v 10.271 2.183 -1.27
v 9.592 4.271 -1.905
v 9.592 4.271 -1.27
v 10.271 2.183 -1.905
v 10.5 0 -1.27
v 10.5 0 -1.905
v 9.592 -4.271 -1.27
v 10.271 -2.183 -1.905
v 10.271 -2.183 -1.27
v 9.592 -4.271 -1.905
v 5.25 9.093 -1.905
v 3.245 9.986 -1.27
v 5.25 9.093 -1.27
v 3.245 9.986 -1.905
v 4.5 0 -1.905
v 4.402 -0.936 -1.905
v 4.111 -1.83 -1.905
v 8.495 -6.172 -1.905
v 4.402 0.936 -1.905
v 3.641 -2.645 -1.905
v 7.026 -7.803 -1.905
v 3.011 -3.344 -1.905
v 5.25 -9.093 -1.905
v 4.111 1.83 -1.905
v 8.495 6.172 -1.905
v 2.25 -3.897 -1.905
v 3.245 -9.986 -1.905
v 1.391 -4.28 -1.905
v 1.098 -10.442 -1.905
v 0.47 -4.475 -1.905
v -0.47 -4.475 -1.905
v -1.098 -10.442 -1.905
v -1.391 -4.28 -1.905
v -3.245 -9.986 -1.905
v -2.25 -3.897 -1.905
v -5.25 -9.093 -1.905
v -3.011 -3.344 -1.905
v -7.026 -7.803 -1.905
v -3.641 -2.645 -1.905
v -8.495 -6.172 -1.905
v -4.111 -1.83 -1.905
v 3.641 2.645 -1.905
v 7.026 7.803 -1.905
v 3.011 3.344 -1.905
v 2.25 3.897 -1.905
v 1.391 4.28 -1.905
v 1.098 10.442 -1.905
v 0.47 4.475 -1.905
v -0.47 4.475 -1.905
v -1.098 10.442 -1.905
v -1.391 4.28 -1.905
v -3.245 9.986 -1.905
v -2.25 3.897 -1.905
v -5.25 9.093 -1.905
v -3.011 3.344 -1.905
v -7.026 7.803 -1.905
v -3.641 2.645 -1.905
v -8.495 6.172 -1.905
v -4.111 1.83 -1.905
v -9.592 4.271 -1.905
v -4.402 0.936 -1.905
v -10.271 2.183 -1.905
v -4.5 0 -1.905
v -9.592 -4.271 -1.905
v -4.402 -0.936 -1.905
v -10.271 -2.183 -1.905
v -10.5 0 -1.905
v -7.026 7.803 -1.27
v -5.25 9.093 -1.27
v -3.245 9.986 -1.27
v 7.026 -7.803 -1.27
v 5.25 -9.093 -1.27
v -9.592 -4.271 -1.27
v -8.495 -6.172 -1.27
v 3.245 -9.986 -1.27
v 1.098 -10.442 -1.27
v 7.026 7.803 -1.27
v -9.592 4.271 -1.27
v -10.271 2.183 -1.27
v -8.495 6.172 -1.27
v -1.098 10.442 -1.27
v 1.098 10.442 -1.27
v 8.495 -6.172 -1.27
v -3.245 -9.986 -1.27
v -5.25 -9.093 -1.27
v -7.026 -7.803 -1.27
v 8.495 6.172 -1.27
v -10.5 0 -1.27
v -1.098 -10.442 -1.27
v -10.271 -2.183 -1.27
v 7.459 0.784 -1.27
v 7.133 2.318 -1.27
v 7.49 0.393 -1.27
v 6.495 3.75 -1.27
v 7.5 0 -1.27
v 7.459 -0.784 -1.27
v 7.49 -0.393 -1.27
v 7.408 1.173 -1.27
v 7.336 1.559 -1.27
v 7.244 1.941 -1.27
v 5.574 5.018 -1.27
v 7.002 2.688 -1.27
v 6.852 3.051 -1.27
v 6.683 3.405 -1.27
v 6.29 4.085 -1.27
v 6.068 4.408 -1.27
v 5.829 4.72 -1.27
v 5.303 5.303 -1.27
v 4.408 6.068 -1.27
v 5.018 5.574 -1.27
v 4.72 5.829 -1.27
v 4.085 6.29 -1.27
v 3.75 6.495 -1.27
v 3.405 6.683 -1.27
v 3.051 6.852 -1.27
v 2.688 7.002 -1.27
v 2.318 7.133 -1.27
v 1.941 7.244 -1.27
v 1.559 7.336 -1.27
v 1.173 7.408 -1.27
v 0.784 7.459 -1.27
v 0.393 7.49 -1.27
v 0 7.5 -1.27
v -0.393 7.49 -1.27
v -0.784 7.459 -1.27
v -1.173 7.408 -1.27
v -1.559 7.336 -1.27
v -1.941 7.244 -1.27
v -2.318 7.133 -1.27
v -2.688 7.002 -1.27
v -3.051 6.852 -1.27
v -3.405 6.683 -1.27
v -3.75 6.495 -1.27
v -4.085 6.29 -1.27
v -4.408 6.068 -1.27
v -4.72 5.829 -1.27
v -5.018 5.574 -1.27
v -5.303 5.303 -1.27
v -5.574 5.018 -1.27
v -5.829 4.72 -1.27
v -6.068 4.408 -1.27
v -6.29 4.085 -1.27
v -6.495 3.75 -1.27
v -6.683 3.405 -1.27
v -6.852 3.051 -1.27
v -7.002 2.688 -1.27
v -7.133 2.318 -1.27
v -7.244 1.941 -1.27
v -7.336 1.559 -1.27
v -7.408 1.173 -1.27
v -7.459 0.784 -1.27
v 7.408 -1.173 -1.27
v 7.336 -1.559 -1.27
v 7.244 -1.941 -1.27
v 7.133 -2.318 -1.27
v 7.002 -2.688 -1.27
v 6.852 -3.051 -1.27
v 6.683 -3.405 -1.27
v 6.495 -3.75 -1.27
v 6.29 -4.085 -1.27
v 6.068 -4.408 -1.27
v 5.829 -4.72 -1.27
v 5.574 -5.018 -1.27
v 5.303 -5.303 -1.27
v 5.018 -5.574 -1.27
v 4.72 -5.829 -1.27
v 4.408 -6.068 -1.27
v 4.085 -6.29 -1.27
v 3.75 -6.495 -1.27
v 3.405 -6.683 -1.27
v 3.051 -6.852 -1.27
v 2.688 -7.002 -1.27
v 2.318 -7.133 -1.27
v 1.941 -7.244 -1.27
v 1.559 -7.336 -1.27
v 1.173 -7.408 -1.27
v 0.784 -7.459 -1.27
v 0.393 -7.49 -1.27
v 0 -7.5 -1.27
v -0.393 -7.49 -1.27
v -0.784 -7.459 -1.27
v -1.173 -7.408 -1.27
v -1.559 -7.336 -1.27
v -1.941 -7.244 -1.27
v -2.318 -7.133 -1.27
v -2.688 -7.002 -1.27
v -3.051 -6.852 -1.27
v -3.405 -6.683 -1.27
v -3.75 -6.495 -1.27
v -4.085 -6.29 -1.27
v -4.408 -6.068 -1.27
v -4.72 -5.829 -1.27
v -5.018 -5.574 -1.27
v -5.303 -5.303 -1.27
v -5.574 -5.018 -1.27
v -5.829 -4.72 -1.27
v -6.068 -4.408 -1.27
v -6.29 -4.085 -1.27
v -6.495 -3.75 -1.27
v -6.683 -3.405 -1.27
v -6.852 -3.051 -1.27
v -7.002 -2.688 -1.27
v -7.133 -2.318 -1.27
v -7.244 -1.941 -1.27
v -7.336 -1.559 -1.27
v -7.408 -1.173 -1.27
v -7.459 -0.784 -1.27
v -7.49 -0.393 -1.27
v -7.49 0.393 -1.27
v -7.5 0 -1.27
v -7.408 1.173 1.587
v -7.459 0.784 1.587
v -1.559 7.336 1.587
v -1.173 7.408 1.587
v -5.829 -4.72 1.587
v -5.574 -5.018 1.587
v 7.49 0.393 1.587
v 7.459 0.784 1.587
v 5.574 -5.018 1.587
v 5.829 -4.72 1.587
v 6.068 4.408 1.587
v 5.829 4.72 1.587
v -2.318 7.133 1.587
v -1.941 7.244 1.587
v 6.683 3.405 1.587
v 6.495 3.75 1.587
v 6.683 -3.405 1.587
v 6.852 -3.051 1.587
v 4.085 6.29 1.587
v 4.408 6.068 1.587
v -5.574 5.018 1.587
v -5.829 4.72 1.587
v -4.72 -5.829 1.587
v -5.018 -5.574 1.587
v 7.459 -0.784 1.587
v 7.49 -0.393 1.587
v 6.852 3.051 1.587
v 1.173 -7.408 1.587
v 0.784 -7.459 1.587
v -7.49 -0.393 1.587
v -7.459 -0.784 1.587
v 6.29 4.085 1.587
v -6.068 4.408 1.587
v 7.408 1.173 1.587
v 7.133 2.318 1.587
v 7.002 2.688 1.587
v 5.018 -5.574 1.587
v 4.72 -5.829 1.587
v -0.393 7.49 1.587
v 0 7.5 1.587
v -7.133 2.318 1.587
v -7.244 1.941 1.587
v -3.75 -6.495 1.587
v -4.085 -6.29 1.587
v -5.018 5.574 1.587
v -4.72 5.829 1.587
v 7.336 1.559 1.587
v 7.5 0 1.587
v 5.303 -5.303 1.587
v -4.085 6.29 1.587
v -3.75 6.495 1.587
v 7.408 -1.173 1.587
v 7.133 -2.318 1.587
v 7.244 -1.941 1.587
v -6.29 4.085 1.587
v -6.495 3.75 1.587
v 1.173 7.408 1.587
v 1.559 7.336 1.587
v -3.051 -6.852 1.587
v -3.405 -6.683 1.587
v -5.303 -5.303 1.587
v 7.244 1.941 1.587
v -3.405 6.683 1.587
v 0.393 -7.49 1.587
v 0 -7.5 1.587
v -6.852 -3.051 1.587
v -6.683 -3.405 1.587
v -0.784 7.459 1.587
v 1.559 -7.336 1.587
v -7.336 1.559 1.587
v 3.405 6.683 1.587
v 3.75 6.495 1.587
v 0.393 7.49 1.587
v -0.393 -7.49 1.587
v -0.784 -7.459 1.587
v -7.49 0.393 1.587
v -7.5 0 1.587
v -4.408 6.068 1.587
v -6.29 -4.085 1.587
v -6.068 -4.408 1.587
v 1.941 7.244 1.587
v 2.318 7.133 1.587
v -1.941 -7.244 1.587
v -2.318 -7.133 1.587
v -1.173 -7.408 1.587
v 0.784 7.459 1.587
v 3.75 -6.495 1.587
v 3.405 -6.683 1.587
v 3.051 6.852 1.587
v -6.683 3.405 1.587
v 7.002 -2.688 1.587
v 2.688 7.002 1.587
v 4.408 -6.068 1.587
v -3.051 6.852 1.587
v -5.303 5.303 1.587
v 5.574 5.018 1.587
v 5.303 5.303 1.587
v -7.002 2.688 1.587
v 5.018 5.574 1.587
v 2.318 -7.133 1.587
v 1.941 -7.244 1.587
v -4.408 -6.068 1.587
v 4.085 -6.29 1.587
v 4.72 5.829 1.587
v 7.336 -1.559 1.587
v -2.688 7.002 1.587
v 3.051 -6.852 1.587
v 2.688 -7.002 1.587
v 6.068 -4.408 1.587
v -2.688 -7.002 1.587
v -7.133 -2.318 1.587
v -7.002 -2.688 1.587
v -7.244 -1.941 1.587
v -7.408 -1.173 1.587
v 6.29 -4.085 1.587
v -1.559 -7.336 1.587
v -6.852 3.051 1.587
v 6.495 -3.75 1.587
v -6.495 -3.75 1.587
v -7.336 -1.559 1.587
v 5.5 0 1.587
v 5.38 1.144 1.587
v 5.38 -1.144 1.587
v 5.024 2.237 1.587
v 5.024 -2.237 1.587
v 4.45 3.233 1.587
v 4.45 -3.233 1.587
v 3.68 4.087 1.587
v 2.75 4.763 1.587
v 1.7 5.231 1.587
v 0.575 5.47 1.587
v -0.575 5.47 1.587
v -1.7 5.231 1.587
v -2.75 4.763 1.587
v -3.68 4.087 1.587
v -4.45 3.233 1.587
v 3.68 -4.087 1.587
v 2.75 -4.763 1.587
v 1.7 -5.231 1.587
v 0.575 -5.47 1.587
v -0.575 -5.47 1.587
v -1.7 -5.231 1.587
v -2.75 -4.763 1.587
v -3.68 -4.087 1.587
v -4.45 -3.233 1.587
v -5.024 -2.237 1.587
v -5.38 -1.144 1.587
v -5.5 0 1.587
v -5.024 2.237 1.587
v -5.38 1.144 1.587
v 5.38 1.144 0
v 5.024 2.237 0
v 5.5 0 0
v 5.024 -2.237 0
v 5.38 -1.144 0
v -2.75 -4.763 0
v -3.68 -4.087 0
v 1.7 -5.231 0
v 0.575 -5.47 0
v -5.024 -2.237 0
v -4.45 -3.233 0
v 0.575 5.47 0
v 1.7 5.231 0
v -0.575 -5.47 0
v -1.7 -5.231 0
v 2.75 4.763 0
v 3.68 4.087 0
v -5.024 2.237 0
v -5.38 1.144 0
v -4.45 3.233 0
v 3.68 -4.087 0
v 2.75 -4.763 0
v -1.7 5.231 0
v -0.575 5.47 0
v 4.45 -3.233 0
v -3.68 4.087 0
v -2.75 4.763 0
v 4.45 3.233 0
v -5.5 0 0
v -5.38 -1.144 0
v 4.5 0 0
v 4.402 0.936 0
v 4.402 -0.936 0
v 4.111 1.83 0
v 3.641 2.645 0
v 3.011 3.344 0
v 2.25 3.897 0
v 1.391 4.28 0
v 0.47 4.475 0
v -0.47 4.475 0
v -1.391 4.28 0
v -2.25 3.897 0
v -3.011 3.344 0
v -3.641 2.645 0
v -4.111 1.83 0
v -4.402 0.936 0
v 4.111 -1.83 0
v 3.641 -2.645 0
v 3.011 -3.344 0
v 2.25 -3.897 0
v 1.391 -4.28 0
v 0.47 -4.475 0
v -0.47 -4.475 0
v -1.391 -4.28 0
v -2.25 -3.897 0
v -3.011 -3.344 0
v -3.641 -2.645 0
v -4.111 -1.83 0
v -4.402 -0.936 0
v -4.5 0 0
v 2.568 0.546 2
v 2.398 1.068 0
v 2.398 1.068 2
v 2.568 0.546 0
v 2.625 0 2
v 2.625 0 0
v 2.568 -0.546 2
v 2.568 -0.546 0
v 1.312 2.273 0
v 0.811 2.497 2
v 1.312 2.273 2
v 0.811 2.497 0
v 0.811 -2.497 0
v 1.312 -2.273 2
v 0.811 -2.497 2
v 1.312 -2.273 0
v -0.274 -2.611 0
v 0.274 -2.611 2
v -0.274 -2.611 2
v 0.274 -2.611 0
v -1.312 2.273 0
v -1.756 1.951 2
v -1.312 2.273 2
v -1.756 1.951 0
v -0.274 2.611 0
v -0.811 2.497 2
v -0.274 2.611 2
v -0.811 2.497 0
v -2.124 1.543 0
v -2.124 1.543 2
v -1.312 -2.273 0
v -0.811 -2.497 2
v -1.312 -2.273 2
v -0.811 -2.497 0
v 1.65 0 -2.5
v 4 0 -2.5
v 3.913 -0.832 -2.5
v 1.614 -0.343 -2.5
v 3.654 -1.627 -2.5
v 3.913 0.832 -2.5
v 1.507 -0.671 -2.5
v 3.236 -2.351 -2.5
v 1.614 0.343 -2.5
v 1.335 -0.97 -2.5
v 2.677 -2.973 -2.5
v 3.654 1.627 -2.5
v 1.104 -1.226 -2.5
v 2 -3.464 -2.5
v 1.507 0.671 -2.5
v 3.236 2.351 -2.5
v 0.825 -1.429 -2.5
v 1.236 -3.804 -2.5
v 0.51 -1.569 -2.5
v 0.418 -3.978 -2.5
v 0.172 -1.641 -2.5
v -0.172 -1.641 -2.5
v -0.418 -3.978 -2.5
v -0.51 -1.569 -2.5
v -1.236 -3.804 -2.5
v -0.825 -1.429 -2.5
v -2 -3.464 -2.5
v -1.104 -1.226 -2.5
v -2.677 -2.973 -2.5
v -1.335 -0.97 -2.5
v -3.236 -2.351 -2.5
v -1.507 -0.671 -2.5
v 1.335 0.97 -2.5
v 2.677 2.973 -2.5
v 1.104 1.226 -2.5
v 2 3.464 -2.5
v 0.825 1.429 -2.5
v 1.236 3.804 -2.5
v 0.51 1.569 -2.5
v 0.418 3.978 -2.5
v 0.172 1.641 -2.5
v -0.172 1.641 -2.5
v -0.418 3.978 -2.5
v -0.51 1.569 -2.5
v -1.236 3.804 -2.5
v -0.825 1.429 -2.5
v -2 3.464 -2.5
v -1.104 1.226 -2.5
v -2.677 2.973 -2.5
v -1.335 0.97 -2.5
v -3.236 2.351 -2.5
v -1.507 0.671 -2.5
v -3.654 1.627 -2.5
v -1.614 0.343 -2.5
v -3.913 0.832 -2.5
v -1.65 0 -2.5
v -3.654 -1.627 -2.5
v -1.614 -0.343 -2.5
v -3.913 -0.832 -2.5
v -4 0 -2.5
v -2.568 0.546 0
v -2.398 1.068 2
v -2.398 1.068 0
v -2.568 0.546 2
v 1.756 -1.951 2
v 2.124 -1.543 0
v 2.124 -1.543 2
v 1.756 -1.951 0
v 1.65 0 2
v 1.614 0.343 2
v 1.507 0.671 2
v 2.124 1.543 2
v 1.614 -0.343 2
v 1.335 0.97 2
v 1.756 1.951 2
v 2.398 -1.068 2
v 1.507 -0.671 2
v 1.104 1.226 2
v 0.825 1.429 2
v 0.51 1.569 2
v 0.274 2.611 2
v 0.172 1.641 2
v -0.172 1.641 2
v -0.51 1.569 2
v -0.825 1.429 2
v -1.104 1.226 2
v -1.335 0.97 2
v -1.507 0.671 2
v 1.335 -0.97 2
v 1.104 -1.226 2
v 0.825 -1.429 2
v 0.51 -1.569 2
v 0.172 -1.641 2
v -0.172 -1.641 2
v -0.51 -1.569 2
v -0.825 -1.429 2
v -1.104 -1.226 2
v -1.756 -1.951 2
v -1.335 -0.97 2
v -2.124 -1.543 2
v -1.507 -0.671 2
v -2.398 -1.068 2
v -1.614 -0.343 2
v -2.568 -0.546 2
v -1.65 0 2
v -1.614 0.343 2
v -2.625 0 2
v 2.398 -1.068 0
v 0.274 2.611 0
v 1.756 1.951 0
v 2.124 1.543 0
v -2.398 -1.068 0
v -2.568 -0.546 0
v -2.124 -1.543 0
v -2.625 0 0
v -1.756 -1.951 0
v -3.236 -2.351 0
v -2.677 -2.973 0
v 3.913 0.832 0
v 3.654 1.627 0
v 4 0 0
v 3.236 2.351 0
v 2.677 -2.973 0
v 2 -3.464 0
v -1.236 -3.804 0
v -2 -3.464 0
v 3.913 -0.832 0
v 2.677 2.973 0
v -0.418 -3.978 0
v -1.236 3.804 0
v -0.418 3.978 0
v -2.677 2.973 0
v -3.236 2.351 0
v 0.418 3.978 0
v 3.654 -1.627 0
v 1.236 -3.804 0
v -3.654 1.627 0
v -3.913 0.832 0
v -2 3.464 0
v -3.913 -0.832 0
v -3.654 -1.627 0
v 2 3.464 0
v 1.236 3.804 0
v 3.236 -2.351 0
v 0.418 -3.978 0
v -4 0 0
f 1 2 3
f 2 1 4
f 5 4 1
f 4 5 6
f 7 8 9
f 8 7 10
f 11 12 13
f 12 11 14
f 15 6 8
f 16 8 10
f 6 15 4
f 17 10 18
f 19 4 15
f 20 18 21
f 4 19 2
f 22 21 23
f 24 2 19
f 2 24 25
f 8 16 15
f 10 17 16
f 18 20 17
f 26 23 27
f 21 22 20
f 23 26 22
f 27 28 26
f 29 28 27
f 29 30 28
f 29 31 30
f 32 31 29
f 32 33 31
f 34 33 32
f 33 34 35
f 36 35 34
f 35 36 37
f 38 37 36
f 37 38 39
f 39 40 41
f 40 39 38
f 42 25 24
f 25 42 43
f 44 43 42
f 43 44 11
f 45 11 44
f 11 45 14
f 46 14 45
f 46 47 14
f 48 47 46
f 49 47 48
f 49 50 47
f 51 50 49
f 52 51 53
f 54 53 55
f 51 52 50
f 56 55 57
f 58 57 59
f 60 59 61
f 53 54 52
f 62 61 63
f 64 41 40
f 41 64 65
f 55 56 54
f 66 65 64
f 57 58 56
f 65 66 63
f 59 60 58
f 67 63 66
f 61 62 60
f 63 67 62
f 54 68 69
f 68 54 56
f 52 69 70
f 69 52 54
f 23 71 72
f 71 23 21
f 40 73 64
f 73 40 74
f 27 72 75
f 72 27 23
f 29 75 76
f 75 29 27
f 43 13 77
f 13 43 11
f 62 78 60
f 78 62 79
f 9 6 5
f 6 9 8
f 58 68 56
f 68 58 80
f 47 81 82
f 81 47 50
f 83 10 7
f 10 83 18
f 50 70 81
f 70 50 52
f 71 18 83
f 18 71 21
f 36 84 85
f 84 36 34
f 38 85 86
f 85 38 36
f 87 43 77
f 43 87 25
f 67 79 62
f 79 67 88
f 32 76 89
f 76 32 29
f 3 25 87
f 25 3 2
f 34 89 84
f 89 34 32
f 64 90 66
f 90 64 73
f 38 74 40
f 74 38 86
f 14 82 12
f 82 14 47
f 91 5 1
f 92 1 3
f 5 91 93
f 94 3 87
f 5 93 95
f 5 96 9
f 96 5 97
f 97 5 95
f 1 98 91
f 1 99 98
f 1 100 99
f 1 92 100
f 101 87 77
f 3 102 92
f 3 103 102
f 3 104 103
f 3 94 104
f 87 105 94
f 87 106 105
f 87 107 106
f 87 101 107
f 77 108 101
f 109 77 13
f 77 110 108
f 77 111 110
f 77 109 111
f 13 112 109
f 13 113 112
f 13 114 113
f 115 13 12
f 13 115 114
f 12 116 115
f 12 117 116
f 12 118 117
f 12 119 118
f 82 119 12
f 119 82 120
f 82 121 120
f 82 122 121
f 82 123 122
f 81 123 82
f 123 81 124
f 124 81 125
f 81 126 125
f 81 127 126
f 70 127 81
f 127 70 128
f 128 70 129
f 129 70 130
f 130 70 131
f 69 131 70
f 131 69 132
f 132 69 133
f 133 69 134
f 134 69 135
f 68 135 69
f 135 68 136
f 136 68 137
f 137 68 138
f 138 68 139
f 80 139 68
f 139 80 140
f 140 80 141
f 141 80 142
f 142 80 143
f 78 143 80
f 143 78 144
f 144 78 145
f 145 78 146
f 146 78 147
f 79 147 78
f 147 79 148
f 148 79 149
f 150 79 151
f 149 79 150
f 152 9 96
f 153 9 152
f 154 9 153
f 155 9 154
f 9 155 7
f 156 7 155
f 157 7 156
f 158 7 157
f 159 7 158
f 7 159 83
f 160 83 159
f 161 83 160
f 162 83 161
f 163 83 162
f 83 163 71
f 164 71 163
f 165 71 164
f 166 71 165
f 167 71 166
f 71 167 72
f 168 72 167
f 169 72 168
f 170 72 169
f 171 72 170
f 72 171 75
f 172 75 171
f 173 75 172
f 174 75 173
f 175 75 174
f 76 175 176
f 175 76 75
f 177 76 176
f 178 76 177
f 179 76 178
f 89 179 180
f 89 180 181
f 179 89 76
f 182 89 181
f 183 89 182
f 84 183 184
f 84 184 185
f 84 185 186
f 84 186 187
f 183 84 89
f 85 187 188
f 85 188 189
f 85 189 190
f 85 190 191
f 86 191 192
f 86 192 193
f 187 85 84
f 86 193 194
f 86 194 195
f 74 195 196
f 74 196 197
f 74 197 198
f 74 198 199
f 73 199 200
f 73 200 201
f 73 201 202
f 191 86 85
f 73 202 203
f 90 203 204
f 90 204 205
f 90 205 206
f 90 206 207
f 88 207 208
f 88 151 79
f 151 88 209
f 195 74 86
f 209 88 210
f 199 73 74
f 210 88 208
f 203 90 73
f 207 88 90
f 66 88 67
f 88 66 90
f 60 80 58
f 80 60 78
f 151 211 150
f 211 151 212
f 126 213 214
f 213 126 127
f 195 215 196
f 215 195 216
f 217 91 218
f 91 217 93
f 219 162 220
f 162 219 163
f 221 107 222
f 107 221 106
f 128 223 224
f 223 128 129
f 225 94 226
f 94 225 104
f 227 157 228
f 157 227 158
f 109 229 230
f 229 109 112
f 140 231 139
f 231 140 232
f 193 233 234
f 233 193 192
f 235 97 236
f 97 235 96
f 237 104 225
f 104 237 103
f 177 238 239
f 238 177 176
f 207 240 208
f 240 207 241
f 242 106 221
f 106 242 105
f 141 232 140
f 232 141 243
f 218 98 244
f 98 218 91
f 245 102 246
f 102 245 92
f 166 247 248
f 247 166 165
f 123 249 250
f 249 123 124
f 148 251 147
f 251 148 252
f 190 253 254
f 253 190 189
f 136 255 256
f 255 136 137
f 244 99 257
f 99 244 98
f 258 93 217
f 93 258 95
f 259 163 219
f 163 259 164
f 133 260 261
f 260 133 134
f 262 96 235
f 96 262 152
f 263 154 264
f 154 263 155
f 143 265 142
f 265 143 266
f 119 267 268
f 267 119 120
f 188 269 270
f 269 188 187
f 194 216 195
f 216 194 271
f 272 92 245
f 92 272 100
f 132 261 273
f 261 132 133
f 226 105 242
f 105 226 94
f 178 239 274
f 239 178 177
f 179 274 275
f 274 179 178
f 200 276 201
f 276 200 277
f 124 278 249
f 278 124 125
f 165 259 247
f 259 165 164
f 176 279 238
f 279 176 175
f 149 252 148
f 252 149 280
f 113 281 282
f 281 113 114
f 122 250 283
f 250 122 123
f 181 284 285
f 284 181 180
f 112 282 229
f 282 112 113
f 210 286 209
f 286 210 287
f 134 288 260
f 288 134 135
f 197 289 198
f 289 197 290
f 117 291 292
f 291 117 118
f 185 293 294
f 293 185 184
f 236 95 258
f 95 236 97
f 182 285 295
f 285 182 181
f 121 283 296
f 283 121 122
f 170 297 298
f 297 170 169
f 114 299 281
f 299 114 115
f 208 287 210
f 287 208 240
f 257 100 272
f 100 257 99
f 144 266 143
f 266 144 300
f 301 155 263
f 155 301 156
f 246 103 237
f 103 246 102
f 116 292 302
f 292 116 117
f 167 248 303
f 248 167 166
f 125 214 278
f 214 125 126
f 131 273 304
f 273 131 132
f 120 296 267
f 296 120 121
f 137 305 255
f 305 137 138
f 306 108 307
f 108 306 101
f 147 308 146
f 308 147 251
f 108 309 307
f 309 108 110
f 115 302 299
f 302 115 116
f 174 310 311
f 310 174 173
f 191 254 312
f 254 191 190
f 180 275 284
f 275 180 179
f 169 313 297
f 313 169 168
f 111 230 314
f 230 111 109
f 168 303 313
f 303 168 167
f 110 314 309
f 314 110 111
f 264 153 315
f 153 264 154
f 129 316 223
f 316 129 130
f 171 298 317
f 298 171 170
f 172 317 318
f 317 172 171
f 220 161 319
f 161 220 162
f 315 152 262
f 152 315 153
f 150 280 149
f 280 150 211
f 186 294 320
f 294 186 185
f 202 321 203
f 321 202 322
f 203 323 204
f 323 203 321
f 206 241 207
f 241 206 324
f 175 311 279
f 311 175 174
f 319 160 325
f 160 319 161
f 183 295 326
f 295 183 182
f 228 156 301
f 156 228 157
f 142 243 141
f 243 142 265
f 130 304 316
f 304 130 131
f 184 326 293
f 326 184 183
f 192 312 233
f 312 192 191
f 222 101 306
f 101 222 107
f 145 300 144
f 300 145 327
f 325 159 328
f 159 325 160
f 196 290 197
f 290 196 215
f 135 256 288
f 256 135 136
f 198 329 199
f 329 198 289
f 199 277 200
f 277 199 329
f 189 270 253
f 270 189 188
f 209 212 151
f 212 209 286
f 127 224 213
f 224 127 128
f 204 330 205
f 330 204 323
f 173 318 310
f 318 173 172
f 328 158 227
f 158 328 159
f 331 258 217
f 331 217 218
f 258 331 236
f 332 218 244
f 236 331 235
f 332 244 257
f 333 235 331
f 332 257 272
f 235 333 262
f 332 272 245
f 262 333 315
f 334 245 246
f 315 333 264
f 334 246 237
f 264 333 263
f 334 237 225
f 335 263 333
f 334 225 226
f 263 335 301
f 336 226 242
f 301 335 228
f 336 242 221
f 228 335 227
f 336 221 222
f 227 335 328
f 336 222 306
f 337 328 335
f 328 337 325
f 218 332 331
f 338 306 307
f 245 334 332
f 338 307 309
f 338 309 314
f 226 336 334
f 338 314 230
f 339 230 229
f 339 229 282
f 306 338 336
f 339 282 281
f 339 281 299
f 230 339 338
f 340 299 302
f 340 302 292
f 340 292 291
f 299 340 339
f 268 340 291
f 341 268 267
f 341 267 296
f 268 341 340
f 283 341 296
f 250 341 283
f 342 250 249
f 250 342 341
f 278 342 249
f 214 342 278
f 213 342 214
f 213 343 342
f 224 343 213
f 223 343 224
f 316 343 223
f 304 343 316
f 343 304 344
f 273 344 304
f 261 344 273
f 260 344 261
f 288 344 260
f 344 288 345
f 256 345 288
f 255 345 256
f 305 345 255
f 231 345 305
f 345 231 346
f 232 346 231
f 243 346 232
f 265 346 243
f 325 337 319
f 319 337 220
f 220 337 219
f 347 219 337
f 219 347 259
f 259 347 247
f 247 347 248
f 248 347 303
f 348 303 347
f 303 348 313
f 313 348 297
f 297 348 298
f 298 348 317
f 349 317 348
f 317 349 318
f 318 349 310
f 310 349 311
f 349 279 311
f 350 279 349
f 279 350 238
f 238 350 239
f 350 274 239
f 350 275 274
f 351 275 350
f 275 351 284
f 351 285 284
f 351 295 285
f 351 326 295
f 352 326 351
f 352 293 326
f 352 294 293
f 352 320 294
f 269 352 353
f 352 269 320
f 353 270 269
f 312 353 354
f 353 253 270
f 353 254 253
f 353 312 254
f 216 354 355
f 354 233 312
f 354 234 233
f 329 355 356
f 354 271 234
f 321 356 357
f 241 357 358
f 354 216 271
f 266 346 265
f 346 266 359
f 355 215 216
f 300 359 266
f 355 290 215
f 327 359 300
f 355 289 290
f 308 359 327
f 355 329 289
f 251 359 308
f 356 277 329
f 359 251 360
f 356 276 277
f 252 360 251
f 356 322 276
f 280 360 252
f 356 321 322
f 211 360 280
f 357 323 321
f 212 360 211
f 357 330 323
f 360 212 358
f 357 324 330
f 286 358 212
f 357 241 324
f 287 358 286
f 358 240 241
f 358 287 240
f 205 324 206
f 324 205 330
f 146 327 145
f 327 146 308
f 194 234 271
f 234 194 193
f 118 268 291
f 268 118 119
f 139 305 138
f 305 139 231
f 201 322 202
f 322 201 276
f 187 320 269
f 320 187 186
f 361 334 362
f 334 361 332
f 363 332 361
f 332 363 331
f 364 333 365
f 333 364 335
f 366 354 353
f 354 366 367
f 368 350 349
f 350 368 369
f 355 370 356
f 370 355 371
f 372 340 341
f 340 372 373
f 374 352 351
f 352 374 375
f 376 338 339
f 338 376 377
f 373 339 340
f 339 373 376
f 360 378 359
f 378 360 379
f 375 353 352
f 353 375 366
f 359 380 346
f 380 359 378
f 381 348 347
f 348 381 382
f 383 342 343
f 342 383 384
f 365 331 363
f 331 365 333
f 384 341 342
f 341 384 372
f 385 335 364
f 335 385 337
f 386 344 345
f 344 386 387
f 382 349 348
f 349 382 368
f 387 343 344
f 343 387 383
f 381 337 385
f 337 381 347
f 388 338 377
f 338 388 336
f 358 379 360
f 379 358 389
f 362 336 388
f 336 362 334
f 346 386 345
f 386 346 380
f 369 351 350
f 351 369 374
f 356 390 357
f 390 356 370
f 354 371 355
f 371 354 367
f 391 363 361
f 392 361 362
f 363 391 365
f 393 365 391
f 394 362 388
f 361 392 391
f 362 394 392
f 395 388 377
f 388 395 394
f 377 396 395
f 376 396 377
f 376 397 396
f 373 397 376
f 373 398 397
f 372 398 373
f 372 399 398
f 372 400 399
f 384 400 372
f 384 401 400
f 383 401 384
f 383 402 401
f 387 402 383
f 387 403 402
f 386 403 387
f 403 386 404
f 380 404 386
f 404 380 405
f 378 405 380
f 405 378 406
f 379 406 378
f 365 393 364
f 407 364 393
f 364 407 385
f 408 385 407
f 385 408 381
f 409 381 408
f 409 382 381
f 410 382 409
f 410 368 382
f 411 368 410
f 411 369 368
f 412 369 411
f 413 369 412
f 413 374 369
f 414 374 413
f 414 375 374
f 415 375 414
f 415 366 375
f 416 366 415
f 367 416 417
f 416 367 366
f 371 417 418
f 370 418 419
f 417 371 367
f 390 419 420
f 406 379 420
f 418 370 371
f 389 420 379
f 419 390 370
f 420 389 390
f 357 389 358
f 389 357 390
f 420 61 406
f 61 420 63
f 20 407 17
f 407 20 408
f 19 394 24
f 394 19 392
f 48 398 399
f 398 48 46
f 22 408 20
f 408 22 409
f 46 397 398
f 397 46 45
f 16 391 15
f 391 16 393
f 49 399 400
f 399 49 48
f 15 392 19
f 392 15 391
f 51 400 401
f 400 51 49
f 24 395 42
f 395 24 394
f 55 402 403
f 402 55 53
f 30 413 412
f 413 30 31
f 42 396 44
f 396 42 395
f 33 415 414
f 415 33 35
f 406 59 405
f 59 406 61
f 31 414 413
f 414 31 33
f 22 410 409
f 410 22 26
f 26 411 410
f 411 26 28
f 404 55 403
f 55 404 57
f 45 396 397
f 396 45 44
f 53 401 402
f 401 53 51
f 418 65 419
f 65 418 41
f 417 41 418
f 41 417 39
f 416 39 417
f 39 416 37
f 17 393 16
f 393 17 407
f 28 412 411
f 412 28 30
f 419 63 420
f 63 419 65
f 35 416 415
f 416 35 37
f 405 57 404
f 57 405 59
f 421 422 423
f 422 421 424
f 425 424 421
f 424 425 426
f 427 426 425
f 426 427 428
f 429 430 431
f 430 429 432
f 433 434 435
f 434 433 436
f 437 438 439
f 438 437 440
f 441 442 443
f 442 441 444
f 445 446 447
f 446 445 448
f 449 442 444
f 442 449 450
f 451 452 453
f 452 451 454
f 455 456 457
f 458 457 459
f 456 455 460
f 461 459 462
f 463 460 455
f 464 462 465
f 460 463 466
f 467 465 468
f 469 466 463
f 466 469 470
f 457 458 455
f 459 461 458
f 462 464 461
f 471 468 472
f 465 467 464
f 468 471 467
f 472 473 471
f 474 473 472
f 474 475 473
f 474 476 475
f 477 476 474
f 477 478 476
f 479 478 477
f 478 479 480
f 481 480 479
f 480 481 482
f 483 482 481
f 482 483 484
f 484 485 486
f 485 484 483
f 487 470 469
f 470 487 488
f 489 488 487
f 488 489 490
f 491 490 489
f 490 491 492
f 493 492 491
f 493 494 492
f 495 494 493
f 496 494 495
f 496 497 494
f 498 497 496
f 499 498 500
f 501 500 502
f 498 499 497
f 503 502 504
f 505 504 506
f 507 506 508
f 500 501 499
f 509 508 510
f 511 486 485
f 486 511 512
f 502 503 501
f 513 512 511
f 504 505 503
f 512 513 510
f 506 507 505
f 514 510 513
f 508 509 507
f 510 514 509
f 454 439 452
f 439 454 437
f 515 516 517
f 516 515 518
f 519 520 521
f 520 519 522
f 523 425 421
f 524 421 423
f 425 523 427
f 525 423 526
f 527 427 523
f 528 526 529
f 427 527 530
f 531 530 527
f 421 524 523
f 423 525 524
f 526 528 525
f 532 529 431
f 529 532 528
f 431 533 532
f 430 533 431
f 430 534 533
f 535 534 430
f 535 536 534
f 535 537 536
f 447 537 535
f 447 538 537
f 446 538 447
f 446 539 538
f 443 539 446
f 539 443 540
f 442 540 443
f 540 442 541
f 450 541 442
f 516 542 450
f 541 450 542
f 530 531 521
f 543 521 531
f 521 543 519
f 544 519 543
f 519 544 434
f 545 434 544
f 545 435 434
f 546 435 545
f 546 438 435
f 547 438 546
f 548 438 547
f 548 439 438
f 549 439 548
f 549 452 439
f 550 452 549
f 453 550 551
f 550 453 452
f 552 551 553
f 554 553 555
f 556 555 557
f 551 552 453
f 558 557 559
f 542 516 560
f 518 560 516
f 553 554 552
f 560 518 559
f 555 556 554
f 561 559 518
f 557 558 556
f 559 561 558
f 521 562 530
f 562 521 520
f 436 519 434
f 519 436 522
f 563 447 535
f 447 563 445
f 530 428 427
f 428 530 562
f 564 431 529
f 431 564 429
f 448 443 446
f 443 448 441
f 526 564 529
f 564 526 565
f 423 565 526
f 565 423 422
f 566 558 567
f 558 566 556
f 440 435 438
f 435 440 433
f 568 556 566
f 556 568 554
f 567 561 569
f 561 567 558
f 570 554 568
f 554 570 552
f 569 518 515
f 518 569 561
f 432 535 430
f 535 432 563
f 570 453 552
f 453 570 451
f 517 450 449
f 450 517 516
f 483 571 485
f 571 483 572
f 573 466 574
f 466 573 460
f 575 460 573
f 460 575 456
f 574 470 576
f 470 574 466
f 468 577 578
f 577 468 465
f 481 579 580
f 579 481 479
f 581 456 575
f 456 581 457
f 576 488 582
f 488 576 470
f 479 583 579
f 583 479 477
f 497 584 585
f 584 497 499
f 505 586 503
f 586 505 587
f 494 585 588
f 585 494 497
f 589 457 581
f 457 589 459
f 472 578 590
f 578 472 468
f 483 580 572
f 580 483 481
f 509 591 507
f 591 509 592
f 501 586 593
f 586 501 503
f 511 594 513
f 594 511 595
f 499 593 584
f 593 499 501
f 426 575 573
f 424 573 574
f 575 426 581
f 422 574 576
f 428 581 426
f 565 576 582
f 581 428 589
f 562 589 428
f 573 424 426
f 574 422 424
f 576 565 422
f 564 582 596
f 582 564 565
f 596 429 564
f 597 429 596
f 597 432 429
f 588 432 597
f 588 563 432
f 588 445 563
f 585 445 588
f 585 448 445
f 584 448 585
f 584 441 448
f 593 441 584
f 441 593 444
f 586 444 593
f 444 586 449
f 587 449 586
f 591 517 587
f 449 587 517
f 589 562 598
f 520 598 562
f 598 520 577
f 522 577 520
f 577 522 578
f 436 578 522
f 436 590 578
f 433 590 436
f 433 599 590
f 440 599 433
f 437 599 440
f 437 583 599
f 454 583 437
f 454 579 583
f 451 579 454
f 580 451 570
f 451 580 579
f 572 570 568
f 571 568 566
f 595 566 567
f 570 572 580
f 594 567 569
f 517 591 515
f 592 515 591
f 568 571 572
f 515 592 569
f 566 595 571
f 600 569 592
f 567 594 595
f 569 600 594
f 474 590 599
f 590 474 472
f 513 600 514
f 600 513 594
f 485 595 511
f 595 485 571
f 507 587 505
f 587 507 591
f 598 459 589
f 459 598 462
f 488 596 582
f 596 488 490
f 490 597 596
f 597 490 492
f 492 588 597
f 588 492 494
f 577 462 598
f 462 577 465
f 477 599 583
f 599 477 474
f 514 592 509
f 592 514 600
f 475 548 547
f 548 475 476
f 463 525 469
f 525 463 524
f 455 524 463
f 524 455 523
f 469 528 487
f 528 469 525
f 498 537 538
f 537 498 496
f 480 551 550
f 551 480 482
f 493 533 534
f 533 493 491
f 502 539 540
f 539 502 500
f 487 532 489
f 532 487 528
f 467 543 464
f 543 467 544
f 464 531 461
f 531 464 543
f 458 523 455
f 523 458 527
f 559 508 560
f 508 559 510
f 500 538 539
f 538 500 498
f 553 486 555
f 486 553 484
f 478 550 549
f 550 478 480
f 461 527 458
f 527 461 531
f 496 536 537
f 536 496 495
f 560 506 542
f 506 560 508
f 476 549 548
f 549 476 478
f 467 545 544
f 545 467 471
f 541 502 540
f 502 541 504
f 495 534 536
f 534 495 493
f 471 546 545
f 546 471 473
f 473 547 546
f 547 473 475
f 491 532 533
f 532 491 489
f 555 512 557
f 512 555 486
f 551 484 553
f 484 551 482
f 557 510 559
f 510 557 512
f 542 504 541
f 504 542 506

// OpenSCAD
$fn=30;
layer_height = 0.3175;

target_thickness = 9;

bearing_od = 11.0;
bearing_id = 5.0;
bearing_width = 4.0;

translate([0,0,-6*layer_height]) cover();
translate([0,0,-target_thickness/2+bearing_width/2]) spacer();

module cover() {
    difference() {
        union() {
            translate([0,0, 0*layer_height]) cylinder(h= 2*layer_height, d=bearing_od+4+6);
            translate([0,0, 2*layer_height]) cylinder(h=9*layer_height, d=bearing_od+4, $fn=120);
        }
        translate([0,0,(12-6)*layer_height]) cylinder(d=bearing_od, h=bearing_width);
        cylinder(d=bearing_od-2, h=100, center=true);
        //cylinder(d1=bearing_od, d2=bearing_od-2, h=4*layer_height);
    }
}

module spacer() {
    difference() {
        union() {
            cylinder(d=bearing_id+0.25, h=target_thickness/2, $fn=30);
            cylinder(d=bearing_id+3, h=target_thickness/2-bearing_width/2, $fn=30);
        }
        translate([0,0,-1]) cylinder(d=3.3, h=100, $fn = 30);
    }
    
}
